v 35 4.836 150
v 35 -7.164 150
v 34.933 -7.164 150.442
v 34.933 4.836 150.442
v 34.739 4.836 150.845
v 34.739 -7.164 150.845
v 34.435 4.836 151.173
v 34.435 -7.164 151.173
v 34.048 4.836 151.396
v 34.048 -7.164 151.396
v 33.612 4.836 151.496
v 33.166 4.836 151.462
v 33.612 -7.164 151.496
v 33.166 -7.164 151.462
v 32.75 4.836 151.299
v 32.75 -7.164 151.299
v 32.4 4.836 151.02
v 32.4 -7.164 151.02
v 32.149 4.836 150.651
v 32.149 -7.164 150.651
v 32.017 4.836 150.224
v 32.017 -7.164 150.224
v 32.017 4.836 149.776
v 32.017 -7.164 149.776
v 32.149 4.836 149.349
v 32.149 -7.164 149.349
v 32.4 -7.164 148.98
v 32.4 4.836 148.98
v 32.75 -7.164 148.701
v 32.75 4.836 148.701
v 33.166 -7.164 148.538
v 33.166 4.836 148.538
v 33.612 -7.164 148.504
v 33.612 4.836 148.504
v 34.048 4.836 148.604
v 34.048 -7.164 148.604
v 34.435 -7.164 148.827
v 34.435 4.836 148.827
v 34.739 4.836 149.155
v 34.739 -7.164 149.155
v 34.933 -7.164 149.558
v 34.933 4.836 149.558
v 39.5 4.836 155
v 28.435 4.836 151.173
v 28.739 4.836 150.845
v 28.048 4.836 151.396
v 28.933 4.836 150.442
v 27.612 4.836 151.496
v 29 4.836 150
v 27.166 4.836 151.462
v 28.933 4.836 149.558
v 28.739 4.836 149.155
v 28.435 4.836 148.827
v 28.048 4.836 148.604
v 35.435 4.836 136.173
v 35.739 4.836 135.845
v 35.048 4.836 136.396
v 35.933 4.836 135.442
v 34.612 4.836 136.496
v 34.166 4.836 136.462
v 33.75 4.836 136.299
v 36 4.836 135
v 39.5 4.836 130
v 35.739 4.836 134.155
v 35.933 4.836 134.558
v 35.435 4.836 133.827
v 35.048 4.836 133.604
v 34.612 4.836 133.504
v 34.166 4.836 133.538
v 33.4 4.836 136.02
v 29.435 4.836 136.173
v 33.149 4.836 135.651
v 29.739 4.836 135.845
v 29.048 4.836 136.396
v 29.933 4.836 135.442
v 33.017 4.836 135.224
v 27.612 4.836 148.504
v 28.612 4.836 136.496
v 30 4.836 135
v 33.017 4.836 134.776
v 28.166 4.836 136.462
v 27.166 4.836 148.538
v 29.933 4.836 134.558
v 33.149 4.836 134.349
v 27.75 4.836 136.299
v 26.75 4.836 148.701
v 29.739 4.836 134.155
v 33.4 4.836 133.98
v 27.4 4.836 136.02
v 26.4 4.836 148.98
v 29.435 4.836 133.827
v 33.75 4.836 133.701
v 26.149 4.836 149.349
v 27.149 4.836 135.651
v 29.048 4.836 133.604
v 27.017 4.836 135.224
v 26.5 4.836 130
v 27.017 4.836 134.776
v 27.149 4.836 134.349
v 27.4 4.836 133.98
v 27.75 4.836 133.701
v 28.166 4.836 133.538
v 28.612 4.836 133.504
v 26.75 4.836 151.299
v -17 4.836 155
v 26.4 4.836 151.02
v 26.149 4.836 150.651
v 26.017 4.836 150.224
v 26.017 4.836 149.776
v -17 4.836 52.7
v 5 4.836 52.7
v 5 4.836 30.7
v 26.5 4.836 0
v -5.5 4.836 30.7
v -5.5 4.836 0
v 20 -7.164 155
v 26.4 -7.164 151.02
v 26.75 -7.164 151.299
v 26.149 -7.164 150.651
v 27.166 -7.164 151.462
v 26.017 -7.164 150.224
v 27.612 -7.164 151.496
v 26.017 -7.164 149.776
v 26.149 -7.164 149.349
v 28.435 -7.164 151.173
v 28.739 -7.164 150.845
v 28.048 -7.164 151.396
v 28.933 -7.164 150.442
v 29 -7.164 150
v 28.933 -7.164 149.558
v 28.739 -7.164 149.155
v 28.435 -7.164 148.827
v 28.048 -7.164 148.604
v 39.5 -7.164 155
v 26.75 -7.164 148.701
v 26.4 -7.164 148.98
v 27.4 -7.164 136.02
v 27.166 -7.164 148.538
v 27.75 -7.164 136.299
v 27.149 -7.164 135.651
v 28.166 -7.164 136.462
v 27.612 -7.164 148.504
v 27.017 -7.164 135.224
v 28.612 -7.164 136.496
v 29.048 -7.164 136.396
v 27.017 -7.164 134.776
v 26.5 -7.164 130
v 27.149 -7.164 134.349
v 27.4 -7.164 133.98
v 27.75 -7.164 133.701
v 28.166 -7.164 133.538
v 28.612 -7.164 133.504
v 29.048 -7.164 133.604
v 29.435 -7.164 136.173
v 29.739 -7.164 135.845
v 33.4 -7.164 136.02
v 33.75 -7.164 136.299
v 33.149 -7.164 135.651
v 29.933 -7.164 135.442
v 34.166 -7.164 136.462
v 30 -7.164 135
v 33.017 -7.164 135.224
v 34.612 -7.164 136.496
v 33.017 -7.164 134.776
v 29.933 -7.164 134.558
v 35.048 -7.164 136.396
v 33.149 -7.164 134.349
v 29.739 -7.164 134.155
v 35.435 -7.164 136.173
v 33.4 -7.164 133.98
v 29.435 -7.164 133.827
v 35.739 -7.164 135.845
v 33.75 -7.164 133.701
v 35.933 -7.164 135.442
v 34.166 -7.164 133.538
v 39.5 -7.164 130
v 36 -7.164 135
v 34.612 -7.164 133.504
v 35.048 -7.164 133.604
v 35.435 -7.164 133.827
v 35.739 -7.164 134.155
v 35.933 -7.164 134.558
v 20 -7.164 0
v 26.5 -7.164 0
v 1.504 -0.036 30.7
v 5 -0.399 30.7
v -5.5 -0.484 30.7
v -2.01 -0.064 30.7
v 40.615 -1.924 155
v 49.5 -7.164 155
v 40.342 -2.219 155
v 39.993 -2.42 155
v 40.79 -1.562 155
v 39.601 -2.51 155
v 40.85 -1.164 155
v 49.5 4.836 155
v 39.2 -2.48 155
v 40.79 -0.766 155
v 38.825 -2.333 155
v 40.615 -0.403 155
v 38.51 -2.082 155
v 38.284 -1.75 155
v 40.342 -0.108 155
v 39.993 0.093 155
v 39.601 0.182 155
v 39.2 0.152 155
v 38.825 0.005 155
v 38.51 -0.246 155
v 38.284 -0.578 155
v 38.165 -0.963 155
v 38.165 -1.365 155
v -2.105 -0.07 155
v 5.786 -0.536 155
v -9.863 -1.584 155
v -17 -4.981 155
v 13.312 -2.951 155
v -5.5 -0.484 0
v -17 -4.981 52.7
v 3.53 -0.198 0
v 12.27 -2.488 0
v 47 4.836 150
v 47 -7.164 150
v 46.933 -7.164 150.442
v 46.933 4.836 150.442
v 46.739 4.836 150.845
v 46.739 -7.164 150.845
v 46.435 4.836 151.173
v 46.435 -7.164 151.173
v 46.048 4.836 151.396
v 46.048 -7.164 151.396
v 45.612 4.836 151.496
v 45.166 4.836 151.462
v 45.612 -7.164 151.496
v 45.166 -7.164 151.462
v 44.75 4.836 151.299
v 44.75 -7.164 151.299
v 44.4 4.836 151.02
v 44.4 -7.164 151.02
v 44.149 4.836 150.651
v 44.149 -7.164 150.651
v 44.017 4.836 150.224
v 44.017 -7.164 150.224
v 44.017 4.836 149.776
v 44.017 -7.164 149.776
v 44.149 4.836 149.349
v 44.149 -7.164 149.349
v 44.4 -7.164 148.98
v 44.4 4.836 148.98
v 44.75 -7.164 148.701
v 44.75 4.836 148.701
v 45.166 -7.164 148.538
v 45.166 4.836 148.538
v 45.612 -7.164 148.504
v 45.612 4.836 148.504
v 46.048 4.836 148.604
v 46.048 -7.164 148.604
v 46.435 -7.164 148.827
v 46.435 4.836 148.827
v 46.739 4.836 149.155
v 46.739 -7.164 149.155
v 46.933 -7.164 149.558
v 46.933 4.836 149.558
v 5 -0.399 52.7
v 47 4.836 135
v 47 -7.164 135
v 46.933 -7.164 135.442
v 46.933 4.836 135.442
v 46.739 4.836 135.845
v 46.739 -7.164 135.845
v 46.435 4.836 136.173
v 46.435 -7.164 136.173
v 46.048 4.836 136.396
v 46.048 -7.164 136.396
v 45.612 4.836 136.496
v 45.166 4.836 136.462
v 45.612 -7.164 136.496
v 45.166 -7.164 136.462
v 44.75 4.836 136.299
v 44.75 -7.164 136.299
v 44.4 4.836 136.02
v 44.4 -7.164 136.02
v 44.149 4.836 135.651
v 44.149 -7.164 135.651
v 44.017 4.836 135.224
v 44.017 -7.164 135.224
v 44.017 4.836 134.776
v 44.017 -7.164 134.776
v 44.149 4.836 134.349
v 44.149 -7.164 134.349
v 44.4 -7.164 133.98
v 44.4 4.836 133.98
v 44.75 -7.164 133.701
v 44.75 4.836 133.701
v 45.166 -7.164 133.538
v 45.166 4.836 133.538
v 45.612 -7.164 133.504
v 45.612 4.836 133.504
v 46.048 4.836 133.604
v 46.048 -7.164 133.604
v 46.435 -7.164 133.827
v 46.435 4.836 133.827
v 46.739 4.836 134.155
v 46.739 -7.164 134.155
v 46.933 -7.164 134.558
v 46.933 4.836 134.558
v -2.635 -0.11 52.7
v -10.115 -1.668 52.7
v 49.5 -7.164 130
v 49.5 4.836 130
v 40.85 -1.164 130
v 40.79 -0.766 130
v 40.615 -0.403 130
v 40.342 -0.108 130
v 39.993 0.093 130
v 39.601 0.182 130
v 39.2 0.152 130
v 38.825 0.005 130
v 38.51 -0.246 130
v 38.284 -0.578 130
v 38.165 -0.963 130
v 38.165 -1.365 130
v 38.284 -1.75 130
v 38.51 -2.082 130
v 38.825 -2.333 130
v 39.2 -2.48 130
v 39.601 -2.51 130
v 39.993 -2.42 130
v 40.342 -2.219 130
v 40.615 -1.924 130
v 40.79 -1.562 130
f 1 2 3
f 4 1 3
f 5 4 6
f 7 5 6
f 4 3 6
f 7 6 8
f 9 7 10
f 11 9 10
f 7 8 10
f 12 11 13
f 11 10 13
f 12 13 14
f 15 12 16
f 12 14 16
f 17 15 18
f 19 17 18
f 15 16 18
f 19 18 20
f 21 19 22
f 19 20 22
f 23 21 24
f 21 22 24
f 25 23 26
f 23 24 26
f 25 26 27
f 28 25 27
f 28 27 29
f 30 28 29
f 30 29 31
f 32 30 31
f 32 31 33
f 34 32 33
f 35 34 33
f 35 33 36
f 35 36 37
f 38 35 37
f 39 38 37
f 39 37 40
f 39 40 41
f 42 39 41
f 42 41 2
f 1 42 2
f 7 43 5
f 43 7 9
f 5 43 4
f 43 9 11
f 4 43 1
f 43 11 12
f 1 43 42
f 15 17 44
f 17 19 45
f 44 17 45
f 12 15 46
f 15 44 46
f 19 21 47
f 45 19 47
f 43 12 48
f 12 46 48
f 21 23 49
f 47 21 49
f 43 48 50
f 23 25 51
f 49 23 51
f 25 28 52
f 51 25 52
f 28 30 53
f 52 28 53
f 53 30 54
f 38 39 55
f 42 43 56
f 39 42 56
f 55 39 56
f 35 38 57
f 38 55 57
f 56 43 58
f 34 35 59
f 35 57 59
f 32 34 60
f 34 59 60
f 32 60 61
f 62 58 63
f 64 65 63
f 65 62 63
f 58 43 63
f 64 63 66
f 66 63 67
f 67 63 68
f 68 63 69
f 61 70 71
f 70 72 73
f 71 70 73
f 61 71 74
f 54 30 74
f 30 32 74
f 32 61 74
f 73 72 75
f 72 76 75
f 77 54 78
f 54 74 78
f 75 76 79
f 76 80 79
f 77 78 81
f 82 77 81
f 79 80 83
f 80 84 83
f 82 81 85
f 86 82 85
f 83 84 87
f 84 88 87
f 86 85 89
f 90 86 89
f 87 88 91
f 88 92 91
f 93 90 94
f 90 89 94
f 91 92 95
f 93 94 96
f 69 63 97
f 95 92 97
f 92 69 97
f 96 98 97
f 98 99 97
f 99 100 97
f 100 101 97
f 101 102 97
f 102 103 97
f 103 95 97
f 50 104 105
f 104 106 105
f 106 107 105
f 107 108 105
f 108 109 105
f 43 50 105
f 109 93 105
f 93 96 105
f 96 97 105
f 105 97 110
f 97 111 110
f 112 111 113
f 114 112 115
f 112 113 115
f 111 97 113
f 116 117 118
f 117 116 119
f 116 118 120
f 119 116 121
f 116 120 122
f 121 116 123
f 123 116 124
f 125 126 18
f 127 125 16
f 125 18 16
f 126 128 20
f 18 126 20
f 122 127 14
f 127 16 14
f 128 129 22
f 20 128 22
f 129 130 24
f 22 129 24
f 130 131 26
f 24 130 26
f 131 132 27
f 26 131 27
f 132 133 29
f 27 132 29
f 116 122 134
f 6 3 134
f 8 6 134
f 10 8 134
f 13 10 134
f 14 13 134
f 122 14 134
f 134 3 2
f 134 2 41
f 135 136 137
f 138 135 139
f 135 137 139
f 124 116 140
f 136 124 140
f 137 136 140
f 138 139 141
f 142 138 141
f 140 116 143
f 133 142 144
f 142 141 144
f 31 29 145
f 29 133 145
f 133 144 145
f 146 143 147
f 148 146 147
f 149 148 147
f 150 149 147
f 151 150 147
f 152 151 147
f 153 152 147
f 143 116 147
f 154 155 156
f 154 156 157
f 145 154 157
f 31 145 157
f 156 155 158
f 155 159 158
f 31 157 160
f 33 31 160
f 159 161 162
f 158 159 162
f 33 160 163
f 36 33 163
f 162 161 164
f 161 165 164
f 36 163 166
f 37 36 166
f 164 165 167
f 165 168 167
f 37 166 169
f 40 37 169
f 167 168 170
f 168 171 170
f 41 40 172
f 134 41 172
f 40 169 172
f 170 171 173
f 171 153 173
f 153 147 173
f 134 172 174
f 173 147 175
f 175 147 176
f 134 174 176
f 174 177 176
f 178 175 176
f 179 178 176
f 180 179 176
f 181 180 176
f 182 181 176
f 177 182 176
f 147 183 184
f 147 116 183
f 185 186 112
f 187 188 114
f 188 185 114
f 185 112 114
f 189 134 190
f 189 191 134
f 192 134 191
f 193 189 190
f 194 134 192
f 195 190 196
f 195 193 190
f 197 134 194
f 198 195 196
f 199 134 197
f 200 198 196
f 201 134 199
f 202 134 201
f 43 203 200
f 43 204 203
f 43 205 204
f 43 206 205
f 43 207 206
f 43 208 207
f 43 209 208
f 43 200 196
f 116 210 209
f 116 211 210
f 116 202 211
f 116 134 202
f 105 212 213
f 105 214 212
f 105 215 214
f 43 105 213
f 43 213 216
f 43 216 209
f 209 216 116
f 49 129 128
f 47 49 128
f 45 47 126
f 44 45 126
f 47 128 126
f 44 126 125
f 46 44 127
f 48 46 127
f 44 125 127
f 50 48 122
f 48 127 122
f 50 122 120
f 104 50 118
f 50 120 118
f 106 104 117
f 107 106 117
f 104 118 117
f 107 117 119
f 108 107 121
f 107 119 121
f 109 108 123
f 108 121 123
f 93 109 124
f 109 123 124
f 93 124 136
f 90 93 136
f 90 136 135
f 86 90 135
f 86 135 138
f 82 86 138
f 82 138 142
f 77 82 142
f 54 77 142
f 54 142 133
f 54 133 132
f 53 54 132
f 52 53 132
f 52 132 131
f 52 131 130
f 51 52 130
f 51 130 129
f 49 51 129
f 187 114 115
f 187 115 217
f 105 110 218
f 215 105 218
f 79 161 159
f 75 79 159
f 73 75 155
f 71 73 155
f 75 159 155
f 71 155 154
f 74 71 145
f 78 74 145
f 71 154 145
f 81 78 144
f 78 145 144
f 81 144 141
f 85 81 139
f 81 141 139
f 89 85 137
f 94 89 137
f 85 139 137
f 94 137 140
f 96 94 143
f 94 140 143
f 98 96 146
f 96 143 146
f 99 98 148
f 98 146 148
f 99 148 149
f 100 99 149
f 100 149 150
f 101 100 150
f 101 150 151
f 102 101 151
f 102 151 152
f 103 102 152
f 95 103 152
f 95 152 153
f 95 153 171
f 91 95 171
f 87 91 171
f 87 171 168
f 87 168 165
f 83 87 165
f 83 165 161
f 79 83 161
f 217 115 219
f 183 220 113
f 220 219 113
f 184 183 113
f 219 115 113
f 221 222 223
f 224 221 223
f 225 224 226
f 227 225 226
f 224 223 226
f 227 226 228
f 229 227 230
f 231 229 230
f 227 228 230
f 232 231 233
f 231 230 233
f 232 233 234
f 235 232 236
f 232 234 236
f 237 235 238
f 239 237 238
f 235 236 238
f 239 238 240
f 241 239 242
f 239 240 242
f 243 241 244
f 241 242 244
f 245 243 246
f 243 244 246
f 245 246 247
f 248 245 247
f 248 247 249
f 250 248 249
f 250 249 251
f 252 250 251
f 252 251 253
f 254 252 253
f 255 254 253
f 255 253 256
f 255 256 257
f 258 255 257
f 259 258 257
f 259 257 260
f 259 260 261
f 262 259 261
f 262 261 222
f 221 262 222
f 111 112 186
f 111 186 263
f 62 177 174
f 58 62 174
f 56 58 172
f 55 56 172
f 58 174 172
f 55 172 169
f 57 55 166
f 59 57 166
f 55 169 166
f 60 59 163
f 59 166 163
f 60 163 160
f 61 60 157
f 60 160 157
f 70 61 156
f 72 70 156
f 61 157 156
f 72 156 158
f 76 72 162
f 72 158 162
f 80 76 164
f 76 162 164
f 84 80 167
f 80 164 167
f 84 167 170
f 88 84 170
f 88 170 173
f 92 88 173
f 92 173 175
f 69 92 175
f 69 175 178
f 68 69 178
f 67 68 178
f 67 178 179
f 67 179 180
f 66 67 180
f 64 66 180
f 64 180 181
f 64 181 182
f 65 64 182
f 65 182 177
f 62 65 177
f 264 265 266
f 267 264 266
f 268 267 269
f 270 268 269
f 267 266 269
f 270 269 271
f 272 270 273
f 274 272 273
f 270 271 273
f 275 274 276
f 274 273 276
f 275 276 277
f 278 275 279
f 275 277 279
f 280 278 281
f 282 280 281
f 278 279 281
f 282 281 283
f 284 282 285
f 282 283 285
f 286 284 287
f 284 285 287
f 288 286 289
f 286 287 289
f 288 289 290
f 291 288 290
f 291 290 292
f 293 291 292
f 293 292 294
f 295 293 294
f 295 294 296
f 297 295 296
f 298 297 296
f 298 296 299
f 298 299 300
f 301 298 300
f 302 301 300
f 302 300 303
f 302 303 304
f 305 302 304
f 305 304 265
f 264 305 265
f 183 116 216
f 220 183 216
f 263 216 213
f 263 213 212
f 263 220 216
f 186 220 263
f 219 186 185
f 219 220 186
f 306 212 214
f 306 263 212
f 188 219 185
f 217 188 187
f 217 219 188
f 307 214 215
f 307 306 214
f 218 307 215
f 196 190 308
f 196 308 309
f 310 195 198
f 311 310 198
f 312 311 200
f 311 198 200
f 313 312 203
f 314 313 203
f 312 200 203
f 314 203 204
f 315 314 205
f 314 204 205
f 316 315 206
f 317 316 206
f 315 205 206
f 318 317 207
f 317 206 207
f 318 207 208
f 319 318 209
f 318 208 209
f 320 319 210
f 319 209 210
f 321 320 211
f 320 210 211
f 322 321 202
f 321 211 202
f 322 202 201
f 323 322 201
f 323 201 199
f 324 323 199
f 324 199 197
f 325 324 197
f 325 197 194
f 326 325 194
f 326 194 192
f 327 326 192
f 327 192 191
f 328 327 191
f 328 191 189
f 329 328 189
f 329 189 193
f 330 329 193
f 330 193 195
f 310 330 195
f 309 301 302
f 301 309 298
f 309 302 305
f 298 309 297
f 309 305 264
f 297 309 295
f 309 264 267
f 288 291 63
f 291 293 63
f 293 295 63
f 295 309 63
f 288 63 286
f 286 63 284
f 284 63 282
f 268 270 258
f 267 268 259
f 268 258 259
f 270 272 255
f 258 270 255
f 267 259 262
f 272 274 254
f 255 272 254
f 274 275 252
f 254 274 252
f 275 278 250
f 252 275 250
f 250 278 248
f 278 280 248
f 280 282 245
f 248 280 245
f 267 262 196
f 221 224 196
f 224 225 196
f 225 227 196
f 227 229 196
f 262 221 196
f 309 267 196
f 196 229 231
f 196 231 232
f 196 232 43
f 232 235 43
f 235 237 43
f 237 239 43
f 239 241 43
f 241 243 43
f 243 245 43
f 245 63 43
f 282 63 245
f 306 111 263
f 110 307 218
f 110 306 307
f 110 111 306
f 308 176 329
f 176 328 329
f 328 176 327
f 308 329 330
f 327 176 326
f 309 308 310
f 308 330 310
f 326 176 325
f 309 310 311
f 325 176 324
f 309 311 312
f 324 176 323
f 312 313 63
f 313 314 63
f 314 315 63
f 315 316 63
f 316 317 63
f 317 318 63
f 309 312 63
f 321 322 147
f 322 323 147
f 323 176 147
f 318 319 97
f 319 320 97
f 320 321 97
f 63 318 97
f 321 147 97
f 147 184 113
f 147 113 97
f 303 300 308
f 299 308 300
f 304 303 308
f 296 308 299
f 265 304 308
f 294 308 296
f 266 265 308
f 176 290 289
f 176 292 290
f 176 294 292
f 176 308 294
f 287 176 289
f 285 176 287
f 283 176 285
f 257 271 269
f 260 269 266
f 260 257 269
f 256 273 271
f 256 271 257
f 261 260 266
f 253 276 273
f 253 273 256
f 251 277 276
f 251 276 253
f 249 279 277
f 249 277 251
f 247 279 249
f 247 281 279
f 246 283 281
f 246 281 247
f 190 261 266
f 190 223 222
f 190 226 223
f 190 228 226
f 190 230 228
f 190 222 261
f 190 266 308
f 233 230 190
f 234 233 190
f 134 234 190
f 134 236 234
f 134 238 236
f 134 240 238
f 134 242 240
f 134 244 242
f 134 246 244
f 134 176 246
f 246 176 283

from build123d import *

# Parameters (mm, degrees)
PAD_DEPTH            = 155
SKETCH001_R          = 1.5
SKETCH001_W          = 13
SKETCH001_H          = 130
POCKET_DEPTH         = 12.001
SKETCH002_W          = 5.583172
SKETCH002_H          = 23.950112
POCKET001_DEPTH      = 25.001
POCKET001_DEPTH_BACK = -130.001
SKETCH003_W          = 22
SKETCH003_H          = 22
POCKET002_DEPTH      = 12.001
SKETCH004_W          = 11.5
SKETCH004_H          = 12.924639
POCKET003_DEPTH      = 31
SKETCH005_W          = 12
SKETCH005_H          = 25
PAD001_DEPTH         = 10
SKETCH006_R          = 1.35
POCKET004_DEPTH      = 155.001
SKETCH007_R          = 1.5
POCKET005_DEPTH      = 12.001003


with BuildPart() as part:
    # Sketch → Pad (new body)
    with BuildSketch(Plane.XY):
        with BuildLine():
            Line((39.5, 4.836187), (-20, 4.836187))
            Line((-20, 4.836187), (-20, -7.163813))
            ThreePointArc((20, -7.163813), (0, 0), (-20, -7.163813))
            Line((20, -7.163813), (39.5, -7.163813))
            Line((39.5, 4.836187), (39.5, -7.163813))
        make_face()
    extrude(amount=PAD_DEPTH)

    # Sketch001 → Pocket (cut, through all)
    with BuildSketch(Plane.XZ.offset(7.163813)):
        with Locations((28.5, 135)):
            Circle(SKETCH001_R)
        with Locations((34.5, 135)):
            Circle(SKETCH001_R)
        with Locations((33, 65)):
            Rectangle(SKETCH001_W, SKETCH001_H)
    extrude(amount=-POCKET_DEPTH, mode=Mode.SUBTRACT)

    # Sketch002 → Pocket001 (cut, two sides)
    with BuildSketch(Plane(origin=(0, 0, 130), x_dir=(1, 0, 0), z_dir=(0, 0, -1))) as pocket001_sk:
        with Locations((-19.791586, -0.240771)):
            Rectangle(SKETCH002_W, SKETCH002_H)
    extrude(amount=-POCKET001_DEPTH, mode=Mode.SUBTRACT)
    extrude(pocket001_sk.sketch, amount=-POCKET001_DEPTH_BACK, mode=Mode.SUBTRACT)

    # Sketch003 → Pocket002 (cut, through all)
    with BuildSketch(Plane(origin=(0, 4.836187, 0), x_dir=(-1, 0, 0), z_dir=(0, 1, 0))):
        with Locations((6, 41.7)):
            Rectangle(SKETCH003_W, SKETCH003_H)
    extrude(amount=-POCKET002_DEPTH, mode=Mode.SUBTRACT)

    # Sketch004 → Pocket003 (cut)
    with BuildSketch(Plane(origin=(0, 0, 0), x_dir=(1, 0, 0), z_dir=(0, 0, -1))):
        with Locations((-11.25, 0.936987)):
            Rectangle(SKETCH004_W, SKETCH004_H)
    extrude(amount=-POCKET003_DEPTH, mode=Mode.SUBTRACT)

    # Sketch005 → Pad001 (new body)
    with BuildSketch(Plane.YZ.offset(39.5)):
        with Locations((-1.16381, 142.5)):
            Rectangle(SKETCH005_W, SKETCH005_H)
    extrude(amount=PAD001_DEPTH)

    # Sketch006 → Pocket004 (cut, through all)
    with BuildSketch(Plane.XY.offset(155)):
        with Locations((39.5, -1.16381)):
            Circle(SKETCH006_R)
    extrude(amount=-POCKET004_DEPTH, mode=Mode.SUBTRACT)

    # Sketch007 → Pocket005 (cut, through all)
    with BuildSketch(Plane.XZ.offset(7.163813)):
        with Locations((27.5, 150)):
            Circle(SKETCH007_R)
        with Locations((33.5, 150)):
            Circle(SKETCH007_R)
        with Locations((45.5, 150)):
            Circle(SKETCH007_R)
        with Locations((45.5, 135)):
            Circle(SKETCH007_R)
    extrude(amount=-POCKET005_DEPTH, mode=Mode.SUBTRACT)


solid = part.part
